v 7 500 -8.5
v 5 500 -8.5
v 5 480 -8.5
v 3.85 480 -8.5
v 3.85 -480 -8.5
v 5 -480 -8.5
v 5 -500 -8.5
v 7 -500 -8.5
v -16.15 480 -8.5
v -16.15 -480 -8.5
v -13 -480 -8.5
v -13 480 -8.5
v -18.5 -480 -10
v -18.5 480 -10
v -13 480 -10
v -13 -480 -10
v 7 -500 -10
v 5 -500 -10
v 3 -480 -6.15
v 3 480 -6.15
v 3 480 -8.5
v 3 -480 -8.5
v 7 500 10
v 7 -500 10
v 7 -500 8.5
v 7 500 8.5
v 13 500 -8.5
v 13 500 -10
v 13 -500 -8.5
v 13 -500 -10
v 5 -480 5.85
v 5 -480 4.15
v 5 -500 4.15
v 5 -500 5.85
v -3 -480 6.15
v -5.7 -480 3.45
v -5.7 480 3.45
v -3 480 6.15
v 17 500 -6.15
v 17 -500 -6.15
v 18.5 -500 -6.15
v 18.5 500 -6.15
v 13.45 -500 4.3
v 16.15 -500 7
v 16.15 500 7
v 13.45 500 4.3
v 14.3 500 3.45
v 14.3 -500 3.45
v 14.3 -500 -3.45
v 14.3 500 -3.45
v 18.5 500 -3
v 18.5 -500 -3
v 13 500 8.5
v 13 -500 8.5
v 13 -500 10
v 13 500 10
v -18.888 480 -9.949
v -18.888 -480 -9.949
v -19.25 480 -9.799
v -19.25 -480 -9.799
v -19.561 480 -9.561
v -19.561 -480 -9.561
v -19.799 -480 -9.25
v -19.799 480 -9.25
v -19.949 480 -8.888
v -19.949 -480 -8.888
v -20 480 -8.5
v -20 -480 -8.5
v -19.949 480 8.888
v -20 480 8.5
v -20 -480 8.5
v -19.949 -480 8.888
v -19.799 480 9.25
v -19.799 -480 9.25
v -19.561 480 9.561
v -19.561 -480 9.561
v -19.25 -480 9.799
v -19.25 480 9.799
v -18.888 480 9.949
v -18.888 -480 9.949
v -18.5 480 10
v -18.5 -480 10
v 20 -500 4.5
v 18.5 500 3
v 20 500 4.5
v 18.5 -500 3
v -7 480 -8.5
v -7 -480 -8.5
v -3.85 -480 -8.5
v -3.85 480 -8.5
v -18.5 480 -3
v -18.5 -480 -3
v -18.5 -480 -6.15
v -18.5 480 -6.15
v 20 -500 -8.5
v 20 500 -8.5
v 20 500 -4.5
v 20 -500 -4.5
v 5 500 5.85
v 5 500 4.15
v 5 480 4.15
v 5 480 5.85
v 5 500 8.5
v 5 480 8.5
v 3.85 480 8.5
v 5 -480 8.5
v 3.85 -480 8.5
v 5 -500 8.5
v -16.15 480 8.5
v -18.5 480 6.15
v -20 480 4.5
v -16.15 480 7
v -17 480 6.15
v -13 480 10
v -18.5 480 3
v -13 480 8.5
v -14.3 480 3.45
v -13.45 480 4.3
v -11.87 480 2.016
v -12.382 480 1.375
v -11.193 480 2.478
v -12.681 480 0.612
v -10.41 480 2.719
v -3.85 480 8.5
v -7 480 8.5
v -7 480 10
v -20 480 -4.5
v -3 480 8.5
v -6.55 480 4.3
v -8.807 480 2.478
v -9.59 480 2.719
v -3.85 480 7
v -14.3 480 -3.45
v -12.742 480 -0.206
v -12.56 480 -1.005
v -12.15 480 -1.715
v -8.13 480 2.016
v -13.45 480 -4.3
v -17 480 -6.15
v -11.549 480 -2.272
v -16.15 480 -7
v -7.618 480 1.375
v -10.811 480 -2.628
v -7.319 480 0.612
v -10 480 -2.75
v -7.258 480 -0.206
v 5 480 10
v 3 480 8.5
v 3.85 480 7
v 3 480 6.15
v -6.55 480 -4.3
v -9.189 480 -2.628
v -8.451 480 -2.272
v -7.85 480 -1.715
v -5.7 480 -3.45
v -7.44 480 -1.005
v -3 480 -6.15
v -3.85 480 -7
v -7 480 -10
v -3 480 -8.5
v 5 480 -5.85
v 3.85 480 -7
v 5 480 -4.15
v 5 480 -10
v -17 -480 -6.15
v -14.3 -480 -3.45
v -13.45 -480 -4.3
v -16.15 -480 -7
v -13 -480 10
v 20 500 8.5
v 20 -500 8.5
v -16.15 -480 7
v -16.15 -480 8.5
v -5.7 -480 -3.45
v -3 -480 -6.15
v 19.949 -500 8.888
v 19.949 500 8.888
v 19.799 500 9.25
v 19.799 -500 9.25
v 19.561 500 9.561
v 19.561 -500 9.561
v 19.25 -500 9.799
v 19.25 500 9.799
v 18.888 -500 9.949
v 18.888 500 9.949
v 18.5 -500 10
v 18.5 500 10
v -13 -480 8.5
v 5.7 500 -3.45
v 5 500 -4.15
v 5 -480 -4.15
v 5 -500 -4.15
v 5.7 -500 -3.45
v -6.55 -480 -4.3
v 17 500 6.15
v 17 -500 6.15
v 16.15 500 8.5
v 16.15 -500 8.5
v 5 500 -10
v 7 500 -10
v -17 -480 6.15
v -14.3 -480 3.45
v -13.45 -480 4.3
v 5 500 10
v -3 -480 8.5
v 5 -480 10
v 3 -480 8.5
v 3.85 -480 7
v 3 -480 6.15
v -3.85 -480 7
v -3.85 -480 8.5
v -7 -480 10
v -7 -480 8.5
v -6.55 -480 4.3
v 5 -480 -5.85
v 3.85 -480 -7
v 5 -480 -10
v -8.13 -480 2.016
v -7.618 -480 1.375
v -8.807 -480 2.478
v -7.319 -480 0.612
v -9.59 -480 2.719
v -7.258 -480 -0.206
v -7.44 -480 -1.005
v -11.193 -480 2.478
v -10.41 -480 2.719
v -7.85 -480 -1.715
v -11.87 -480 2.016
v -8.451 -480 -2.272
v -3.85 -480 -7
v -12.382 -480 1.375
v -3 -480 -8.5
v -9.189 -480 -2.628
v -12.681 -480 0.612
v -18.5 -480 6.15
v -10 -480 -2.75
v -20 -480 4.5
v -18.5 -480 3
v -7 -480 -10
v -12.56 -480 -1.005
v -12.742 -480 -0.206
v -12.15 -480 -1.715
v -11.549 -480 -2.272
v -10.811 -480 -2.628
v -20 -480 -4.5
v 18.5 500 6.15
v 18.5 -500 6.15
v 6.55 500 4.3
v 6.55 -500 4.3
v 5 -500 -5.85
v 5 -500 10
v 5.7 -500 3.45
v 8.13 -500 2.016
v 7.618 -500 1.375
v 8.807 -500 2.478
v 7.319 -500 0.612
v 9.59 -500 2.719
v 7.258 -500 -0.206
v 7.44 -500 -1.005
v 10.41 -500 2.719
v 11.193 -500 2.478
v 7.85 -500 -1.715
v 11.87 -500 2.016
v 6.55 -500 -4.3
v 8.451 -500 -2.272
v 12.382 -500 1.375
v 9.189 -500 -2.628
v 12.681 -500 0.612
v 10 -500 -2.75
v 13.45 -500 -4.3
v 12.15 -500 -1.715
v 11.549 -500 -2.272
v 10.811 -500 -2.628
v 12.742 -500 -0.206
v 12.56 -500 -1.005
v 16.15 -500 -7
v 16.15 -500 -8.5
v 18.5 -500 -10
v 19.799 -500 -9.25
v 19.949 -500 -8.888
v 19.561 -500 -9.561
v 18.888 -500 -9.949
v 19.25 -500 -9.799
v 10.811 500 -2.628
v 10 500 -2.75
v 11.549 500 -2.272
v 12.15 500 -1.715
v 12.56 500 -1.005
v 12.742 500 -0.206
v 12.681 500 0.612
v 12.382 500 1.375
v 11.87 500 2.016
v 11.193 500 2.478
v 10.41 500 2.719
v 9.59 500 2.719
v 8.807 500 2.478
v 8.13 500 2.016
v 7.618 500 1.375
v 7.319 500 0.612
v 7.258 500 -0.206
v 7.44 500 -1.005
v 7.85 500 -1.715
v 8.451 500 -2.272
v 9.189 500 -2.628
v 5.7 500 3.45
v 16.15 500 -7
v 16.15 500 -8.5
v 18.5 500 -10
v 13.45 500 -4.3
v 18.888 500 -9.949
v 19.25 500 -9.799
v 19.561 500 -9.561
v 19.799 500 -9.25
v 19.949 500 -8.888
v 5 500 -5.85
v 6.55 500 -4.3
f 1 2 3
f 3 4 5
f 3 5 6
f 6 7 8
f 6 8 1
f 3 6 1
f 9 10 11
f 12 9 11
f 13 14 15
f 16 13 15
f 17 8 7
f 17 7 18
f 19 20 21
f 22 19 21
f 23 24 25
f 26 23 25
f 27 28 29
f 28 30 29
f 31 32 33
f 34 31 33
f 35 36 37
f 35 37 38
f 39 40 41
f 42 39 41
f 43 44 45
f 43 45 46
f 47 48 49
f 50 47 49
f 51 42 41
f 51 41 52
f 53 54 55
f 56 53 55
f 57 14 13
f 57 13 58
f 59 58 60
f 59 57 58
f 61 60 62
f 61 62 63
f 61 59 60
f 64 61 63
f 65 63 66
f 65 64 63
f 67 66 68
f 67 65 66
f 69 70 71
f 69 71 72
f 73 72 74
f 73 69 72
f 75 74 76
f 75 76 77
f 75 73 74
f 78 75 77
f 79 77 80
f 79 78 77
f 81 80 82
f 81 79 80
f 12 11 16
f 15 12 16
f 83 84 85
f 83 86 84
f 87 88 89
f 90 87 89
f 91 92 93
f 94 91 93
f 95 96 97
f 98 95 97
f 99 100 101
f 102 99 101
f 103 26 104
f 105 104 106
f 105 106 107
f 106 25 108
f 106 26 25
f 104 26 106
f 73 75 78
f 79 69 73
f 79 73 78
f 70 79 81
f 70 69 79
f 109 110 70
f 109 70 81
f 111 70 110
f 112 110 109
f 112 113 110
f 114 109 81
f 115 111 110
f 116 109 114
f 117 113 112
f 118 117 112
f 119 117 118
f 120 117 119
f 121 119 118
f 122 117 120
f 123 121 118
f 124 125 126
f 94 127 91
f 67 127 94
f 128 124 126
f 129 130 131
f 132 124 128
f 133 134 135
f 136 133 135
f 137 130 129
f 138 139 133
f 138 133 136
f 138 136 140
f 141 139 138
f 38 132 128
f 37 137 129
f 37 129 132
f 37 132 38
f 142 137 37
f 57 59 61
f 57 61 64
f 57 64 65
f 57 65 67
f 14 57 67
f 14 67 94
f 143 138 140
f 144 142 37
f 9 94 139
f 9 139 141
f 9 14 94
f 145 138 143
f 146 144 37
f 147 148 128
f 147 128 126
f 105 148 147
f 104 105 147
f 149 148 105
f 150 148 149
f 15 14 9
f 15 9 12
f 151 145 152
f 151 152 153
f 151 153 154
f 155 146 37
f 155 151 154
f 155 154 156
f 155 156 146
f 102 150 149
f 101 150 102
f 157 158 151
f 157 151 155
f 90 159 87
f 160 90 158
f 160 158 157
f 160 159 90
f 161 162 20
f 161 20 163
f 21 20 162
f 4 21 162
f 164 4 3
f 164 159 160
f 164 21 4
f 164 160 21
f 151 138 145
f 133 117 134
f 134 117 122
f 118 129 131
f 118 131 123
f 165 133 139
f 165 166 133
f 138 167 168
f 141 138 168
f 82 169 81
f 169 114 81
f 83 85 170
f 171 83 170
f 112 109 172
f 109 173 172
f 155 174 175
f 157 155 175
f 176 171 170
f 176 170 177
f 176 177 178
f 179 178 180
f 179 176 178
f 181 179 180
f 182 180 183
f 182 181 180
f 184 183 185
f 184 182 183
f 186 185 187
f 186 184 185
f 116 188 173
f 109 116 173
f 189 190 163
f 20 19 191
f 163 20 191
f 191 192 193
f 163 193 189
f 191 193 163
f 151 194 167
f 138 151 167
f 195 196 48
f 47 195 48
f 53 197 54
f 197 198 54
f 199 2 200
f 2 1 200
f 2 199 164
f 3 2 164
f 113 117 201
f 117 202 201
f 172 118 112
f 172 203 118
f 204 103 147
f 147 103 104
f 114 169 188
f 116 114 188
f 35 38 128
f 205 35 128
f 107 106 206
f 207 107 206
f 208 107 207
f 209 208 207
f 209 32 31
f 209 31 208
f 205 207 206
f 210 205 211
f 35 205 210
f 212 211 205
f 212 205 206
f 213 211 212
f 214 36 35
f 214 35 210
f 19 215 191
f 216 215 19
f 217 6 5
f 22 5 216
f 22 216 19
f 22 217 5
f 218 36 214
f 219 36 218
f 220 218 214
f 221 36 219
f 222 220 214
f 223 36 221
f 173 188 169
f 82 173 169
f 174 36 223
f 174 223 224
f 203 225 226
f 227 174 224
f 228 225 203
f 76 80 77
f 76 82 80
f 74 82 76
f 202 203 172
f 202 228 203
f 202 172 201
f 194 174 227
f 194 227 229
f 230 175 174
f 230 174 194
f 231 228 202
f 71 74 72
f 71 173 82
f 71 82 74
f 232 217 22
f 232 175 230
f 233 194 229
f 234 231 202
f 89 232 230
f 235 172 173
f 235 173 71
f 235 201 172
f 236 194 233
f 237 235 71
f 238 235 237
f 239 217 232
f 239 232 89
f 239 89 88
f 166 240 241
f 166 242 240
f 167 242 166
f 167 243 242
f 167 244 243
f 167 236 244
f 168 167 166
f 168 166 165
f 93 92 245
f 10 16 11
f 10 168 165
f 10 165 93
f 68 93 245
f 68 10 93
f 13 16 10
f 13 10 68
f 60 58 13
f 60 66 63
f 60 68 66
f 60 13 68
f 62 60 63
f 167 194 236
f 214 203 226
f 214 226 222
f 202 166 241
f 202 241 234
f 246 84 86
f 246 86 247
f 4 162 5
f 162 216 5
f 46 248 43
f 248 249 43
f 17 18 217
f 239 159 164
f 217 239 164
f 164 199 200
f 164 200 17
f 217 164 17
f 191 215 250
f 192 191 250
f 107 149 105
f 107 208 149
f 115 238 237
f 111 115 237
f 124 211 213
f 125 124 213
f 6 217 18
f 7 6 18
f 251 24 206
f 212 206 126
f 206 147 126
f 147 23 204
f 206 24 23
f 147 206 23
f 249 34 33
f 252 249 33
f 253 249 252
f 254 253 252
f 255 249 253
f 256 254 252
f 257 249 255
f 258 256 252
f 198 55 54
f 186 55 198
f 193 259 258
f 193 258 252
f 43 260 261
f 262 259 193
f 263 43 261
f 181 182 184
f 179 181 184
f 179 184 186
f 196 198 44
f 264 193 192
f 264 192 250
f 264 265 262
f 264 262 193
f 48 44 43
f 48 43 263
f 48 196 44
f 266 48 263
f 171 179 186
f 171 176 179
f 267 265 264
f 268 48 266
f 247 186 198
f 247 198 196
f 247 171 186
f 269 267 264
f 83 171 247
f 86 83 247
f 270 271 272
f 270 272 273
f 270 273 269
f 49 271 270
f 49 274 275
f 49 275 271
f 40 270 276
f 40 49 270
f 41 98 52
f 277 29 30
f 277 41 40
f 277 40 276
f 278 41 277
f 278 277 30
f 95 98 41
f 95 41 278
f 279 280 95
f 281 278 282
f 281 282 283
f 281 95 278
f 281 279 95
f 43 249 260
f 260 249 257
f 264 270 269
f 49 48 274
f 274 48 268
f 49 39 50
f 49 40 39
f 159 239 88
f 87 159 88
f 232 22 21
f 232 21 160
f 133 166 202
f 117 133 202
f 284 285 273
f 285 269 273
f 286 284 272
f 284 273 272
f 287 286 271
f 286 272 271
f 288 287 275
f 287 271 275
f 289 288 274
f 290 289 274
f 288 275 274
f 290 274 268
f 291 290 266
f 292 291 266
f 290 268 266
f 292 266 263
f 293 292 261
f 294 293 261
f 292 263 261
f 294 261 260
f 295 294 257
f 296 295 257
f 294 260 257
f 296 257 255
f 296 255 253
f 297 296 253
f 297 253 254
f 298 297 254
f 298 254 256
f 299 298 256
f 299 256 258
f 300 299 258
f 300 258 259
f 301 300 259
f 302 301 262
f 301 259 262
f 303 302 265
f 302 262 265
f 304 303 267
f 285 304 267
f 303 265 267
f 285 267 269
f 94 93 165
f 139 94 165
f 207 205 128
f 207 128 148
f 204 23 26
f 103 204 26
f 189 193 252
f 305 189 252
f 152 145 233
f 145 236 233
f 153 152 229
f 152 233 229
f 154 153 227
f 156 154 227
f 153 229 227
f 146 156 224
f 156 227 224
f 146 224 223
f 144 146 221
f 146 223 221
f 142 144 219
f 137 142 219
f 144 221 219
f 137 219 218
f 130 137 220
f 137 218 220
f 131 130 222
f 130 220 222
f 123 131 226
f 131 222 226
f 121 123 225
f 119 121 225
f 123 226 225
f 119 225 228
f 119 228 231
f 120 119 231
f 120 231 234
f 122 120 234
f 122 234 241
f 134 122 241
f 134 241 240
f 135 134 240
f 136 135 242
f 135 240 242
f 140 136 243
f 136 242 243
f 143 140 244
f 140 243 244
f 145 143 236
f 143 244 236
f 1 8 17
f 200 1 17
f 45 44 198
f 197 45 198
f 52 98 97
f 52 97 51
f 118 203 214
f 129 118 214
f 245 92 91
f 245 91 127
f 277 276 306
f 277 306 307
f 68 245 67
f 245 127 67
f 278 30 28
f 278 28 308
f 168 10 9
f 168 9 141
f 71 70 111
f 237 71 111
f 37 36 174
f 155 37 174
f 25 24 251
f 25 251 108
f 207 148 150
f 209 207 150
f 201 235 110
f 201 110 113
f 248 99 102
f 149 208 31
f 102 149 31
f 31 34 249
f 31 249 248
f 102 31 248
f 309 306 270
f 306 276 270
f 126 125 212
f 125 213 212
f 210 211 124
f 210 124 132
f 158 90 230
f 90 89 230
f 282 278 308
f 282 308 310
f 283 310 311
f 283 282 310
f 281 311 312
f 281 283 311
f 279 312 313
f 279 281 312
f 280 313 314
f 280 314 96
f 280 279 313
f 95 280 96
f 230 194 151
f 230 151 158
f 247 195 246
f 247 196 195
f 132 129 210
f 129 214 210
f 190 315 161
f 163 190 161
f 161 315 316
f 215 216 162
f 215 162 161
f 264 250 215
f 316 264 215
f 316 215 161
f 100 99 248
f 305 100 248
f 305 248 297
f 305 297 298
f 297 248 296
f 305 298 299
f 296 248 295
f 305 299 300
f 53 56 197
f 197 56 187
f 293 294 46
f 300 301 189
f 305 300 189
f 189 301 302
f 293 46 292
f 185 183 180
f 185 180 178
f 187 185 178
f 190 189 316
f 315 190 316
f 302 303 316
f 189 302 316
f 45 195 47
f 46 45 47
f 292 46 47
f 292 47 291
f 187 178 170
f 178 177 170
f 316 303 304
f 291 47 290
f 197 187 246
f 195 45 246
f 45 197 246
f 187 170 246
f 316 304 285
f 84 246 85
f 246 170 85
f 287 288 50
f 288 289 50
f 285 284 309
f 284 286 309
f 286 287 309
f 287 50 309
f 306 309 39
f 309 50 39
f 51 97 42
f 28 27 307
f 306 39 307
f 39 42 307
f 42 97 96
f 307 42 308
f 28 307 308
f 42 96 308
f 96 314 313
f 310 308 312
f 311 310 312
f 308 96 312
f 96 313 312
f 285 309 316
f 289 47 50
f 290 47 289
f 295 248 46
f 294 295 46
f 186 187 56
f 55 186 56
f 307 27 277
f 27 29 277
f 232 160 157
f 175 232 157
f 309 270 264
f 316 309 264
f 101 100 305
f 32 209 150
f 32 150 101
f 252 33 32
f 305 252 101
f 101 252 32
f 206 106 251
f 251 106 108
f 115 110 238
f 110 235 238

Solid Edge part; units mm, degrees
sketch "Sketch1" plane through (0, 0, 0) normal (0, -1, 0) x (1, 0, 0)
  line L0 (-20, -10) -> (20, -10)
  line L1 (20, -10) -> (20, 10)
  line L2 (20, 10) -> (-20, 10)
  line L3 (-20, 10) -> (-20, -10)
  dimension "D1" = 40
  dimension "D2" = 20
extrude "Protrusion1" add sketch "Sketch1" along normal mid plane 1000
sketch "Sketch2" plane through (0, -500, 0) normal (0, -1, 0) x (1, 0, 0)
  line L0 (-20, -3) -> (-18.5, -3)
  line L1 (-18.5, -3) -> (-18.5, -6.15)
  line L2 (-18.5, -6.15) -> (-17, -6.15)
  line L3 (-14.3, -3.45) -> (-17, -6.15)
  line L4 (-14.3, -3.45) -> (-14.3, 3.45)
  line L5 (-14.3, 3.45) -> (-17, 6.15)
  line L6 (-18.5, 6.15) -> (-17, 6.15)
  line L7 (-18.5, 6.15) -> (-18.5, 3)
  line L8 (-18.5, 3) -> (-20, 3)
  line L9 (-20, 3) -> (-20, -3)
  dimension "D1" = 4.2
  dimension "D2" = 5.7
  dimension "D3" = 1.5
  dimension "D4" = 6
  dimension "D5" = 12.3
extrude "Cutout1" cut sketch "Sketch2" against normal through all
fillet "Verrundung_1" radius 1.5 4 edges at (20, 0, 10) (-20, 0, 10) (20, 0, -10) (-20, 0, -10)
pattern_circular "Pattern1" count 4 over 360 about axis through (-10, -500, 0) along (0, -1, 0) of "Cutout1"
fillet "Round1" [suppressed]
fillet "Round2" [suppressed]
fillet "Round3" [suppressed]
mirror "Mirror1" about plane through (0, 0, 0) normal (1, 0, 0) of "Cutout1", "Pattern1"
fillet "Round4" [suppressed]
fillet "Round5" [suppressed]
fillet "Round6" [suppressed]
fillet "Round7" [suppressed]
sketch "Sketch3" plane through (0, -500, 0) normal (0, -1, 0) x (-1, 0, 0)
  line L0 (-3, 8.5) -> (3, 8.5)
  line L1 (3, 8.5) -> (3, -8.5)
  line L2 (3, -8.5) -> (-3, -8.5)
  line L3 (-3, -8.5) -> (-3, 8.5)
extrude "Cutout9" cut sketch "Sketch3" against normal through all
hole "Hole1" at (-10, -500, 0) direction (0, 1, 0) diameter 5.5 end up to next
hole "Hole2" at (10, -500, 0) direction (0, 1, 0) diameter 5.5 end up to next
sketch "Sketch4" plane through (0, -500, 0) normal (0, -1, 0) x (1, 0, 0)
  line L0 (-18.5, 3) -> (-20, 4.5)
  line L1 (-20, 4.5) -> (-20, 3)
  line L2 (-20, 3) -> (-18.5, 3)
  line L3 (-18.5, -3) -> (-20, -4.5)
  line L4 (-20, -4.5) -> (-20, -3)
  line L5 (-20, -3) -> (-18.5, -3)
  line L6 (18.5, 3) -> (20, 4.5)
  line L7 (20, 4.5) -> (20, 3)
  line L8 (20, 3) -> (18.5, 3)
  line L9 (18.5, -3) -> (20, -3)
  line L10 (20, -4.5) -> (20, -3)
  line L11 (20, -4.5) -> (18.5, -3)
extrude "Cutout10" cut sketch "Sketch4" against normal through all
sketch "Sketch5" plane through (0, 0, -10) normal (0, 0, -1) x (0, 1, 0)
  line L0 (-480, 5) -> (-480, -20)
  line L1 (-480, -20) -> (-500, -20)
  line L2 (-500, -20) -> (-500, 5)
  line L3 (-480, 5) -> (-500, 5)
  dimension "D1" = 20
  dimension "D2" = 25
extrude "Cutout11" cut sketch "Sketch5" against normal through all
mirror "Mirror2" about plane through (0, 0, 0) normal (0, -1, 0) of "Cutout11"
